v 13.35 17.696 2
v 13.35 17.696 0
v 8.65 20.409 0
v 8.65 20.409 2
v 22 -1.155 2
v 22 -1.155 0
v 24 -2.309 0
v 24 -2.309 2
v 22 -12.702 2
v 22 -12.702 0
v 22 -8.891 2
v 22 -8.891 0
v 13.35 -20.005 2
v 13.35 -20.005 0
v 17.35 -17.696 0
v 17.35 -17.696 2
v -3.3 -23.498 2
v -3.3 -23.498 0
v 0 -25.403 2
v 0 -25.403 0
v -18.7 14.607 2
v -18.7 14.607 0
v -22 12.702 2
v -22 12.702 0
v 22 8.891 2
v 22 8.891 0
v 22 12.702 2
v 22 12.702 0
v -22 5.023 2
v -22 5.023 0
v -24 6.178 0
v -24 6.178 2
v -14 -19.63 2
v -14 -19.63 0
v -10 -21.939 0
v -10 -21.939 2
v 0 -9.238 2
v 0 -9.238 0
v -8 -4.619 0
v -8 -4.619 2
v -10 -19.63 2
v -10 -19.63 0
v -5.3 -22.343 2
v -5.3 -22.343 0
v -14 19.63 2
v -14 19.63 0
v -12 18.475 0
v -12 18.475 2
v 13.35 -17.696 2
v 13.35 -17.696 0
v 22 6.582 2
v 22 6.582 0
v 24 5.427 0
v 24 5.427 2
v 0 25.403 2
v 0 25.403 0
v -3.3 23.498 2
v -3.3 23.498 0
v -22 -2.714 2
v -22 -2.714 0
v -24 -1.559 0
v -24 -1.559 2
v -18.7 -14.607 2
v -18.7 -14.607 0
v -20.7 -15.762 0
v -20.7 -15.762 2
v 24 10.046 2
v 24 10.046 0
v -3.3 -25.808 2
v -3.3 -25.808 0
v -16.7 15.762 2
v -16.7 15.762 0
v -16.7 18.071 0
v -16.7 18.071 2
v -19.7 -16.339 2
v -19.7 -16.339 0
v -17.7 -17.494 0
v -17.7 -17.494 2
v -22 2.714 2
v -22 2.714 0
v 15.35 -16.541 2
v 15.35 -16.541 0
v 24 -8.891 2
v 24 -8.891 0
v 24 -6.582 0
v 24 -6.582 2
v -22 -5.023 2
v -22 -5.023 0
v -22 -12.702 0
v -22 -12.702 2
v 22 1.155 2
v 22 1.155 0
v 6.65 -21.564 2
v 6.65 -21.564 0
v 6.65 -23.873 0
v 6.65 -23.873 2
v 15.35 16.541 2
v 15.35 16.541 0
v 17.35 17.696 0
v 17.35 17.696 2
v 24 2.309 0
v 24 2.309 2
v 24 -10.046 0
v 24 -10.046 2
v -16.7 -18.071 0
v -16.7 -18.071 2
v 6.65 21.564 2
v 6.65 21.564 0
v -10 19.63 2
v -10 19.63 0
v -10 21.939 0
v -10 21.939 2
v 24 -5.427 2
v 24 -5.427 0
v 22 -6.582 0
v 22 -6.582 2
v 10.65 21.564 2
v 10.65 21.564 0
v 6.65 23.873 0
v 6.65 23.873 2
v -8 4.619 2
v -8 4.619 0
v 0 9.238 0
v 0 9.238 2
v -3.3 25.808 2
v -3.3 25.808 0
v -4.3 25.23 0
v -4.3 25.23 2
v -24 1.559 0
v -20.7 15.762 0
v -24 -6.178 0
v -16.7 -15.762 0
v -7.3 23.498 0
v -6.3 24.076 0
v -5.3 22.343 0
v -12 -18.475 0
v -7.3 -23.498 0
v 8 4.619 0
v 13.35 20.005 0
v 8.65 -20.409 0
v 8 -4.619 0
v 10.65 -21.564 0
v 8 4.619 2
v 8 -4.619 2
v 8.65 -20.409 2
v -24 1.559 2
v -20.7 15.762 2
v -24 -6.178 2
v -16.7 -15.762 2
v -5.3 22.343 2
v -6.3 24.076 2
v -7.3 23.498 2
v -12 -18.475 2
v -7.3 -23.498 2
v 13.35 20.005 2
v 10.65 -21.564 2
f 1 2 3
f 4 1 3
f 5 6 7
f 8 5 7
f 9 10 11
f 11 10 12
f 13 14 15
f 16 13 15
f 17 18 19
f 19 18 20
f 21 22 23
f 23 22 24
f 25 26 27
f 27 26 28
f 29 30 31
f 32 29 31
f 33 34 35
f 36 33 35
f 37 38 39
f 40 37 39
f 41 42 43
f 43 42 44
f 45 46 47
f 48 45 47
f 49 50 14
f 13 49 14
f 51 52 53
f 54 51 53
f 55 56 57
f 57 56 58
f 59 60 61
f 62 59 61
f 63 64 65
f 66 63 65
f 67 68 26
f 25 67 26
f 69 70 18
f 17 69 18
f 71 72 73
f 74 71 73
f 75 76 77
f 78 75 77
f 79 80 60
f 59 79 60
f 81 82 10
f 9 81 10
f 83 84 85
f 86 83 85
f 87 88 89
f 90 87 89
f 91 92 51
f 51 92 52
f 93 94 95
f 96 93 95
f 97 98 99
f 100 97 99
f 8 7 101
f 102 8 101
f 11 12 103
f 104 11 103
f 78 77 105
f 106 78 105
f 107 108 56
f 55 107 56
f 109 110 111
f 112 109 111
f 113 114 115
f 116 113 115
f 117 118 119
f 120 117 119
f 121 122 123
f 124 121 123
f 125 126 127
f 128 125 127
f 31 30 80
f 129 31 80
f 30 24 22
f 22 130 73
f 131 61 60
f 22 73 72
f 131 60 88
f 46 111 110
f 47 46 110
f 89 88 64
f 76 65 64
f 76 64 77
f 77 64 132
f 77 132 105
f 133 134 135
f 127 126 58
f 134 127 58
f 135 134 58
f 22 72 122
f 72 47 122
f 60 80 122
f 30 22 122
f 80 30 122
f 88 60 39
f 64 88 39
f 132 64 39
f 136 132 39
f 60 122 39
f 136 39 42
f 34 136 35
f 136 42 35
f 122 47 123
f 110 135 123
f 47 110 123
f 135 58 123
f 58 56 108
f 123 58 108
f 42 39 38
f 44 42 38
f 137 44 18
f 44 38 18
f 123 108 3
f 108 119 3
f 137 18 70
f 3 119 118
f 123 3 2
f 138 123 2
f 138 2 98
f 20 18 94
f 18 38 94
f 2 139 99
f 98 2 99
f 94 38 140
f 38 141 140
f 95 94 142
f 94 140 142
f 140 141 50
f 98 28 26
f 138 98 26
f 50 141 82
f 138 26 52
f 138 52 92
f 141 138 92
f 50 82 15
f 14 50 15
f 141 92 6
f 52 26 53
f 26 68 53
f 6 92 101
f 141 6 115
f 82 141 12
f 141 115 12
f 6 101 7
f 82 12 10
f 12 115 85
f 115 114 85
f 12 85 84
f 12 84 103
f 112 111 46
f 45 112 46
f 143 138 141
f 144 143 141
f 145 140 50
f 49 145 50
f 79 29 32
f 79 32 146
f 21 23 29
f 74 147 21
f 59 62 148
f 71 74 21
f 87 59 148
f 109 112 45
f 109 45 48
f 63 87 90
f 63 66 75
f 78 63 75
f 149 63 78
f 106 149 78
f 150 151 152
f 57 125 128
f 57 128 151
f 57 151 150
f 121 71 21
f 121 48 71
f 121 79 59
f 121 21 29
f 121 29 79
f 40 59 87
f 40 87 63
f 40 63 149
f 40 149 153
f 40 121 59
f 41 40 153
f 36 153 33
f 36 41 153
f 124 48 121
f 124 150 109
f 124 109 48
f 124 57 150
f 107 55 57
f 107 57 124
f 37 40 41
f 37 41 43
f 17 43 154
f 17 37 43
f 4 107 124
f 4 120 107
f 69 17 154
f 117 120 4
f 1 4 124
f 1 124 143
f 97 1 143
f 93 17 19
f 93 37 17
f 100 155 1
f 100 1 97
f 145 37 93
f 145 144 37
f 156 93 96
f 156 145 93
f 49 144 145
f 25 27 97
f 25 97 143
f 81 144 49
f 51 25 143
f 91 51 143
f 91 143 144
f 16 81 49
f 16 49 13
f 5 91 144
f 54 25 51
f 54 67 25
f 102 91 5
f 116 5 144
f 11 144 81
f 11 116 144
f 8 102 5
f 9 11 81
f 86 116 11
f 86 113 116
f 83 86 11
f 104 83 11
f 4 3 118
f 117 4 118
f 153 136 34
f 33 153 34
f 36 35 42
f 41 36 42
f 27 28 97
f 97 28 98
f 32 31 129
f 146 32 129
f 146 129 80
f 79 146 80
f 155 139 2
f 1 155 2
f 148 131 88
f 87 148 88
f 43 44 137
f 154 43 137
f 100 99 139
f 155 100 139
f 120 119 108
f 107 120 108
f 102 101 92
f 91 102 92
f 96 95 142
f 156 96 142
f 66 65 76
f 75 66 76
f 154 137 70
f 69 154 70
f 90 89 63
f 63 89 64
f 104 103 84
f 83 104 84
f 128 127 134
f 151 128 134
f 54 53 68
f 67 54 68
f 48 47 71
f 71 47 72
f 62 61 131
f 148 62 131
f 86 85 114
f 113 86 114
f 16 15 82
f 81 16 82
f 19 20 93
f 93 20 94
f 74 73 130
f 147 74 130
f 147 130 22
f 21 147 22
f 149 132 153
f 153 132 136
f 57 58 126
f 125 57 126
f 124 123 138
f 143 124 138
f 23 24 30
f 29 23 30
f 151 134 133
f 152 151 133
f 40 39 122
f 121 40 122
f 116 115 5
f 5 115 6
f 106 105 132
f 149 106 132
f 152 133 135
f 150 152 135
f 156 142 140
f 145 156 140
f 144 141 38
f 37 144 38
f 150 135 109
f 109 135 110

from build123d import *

# Parameters (mm, degrees)
F4_DEPTH = 2
F5_DEPTH = 2
F6_COUNT = 2
F6_ANGLE = 60
F8_DEPTH = 2
F9_COUNT = 3
F9_ANGLE = 240


with BuildPart() as f4:
    # F3 (on Top) → F4 (new body)
    with BuildSketch(Plane.XY):
        Polygon((-8, 4.6188021535), (-20, 11.5470053838), (-20, -11.5470053838), (-8, -4.6188021535), align=None)
        Polygon((-18, -9.237604307), (-18, 9.237604307), (-10, 4.6188021535), (-10, -4.6188021535), align=None, mode=Mode.SUBTRACT)
        Polygon((-10, 4.6188021535), (-18, 9.237604307), (-18, -9.237604307), (-10, -4.6188021535), align=None)
    extrude(amount=F4_DEPTH)

    # F3 (on Top) → F5 (join)
    with BuildSketch(Plane.XY):
        Polygon((-20, -11.5470053838), (-20, 11.5470053838), (-22, 12.7017059222), (-22, -12.7017059222), align=None)
    extrude(amount=F5_DEPTH)

    # F6: F4 ×2 about axis
    f6_axis = Axis((0, 0, 0), (0, 0, 1))


with BuildPart() as f4_1:
    add(f4.part)
    for i in range(1, F6_COUNT):
        add(f4.part.rotate(f6_axis, i * F6_ANGLE / (F6_COUNT - 1)))

    # F7 (on Top) → F8 (join, through all)
    with BuildSketch(Plane.XY):
        Polygon((-24, 1.5588457268), (-22, 2.7135462652), (-22, 5.0229473419), (-24, 6.1776478803), (-24, 5.0229473419), (-24, 2.7135462652), align=None)
        Polygon((-24, -6.1776478803), (-22, -5.0229473419), (-22, -2.7135462652), (-24, -1.5588457268), (-24, -2.7135462652), (-24, -5.0229473419), align=None)
        Polygon((-19.7, -16.3390126181), (-17.7, -17.4937131564), (-16.7, -18.0710634256), (-16.7, -15.7616623489), (-18.7, -14.6069618105), (-20.7, -15.7616623489), align=None)
        Polygon((-13, -20.2072594216), (-11, -21.36195996), (-10, -21.9393102292), (-10, -19.6299091524), (-12, -18.4752086141), (-14, -19.6299091524), align=None)
        Polygon((-7.3, -23.498155956), (-6.3, -24.0755062252), (-4.3, -25.2302067636), (-3.3, -25.8075570328), (-3.3, -23.498155956), (-5.3, -22.3434554176), align=None)
    extrude(amount=F8_DEPTH)

    # F9: F4 ×3 about axis
    f9_axis = Axis((0, 0, 0), (0, 0, 1))


with BuildPart() as f4_2:
    add(f4_1.part)
    for i in range(1, F9_COUNT):
        add(f4_1.part.rotate(f9_axis, i * F9_ANGLE / (F9_COUNT - 1)))


solid = f4_2.part
